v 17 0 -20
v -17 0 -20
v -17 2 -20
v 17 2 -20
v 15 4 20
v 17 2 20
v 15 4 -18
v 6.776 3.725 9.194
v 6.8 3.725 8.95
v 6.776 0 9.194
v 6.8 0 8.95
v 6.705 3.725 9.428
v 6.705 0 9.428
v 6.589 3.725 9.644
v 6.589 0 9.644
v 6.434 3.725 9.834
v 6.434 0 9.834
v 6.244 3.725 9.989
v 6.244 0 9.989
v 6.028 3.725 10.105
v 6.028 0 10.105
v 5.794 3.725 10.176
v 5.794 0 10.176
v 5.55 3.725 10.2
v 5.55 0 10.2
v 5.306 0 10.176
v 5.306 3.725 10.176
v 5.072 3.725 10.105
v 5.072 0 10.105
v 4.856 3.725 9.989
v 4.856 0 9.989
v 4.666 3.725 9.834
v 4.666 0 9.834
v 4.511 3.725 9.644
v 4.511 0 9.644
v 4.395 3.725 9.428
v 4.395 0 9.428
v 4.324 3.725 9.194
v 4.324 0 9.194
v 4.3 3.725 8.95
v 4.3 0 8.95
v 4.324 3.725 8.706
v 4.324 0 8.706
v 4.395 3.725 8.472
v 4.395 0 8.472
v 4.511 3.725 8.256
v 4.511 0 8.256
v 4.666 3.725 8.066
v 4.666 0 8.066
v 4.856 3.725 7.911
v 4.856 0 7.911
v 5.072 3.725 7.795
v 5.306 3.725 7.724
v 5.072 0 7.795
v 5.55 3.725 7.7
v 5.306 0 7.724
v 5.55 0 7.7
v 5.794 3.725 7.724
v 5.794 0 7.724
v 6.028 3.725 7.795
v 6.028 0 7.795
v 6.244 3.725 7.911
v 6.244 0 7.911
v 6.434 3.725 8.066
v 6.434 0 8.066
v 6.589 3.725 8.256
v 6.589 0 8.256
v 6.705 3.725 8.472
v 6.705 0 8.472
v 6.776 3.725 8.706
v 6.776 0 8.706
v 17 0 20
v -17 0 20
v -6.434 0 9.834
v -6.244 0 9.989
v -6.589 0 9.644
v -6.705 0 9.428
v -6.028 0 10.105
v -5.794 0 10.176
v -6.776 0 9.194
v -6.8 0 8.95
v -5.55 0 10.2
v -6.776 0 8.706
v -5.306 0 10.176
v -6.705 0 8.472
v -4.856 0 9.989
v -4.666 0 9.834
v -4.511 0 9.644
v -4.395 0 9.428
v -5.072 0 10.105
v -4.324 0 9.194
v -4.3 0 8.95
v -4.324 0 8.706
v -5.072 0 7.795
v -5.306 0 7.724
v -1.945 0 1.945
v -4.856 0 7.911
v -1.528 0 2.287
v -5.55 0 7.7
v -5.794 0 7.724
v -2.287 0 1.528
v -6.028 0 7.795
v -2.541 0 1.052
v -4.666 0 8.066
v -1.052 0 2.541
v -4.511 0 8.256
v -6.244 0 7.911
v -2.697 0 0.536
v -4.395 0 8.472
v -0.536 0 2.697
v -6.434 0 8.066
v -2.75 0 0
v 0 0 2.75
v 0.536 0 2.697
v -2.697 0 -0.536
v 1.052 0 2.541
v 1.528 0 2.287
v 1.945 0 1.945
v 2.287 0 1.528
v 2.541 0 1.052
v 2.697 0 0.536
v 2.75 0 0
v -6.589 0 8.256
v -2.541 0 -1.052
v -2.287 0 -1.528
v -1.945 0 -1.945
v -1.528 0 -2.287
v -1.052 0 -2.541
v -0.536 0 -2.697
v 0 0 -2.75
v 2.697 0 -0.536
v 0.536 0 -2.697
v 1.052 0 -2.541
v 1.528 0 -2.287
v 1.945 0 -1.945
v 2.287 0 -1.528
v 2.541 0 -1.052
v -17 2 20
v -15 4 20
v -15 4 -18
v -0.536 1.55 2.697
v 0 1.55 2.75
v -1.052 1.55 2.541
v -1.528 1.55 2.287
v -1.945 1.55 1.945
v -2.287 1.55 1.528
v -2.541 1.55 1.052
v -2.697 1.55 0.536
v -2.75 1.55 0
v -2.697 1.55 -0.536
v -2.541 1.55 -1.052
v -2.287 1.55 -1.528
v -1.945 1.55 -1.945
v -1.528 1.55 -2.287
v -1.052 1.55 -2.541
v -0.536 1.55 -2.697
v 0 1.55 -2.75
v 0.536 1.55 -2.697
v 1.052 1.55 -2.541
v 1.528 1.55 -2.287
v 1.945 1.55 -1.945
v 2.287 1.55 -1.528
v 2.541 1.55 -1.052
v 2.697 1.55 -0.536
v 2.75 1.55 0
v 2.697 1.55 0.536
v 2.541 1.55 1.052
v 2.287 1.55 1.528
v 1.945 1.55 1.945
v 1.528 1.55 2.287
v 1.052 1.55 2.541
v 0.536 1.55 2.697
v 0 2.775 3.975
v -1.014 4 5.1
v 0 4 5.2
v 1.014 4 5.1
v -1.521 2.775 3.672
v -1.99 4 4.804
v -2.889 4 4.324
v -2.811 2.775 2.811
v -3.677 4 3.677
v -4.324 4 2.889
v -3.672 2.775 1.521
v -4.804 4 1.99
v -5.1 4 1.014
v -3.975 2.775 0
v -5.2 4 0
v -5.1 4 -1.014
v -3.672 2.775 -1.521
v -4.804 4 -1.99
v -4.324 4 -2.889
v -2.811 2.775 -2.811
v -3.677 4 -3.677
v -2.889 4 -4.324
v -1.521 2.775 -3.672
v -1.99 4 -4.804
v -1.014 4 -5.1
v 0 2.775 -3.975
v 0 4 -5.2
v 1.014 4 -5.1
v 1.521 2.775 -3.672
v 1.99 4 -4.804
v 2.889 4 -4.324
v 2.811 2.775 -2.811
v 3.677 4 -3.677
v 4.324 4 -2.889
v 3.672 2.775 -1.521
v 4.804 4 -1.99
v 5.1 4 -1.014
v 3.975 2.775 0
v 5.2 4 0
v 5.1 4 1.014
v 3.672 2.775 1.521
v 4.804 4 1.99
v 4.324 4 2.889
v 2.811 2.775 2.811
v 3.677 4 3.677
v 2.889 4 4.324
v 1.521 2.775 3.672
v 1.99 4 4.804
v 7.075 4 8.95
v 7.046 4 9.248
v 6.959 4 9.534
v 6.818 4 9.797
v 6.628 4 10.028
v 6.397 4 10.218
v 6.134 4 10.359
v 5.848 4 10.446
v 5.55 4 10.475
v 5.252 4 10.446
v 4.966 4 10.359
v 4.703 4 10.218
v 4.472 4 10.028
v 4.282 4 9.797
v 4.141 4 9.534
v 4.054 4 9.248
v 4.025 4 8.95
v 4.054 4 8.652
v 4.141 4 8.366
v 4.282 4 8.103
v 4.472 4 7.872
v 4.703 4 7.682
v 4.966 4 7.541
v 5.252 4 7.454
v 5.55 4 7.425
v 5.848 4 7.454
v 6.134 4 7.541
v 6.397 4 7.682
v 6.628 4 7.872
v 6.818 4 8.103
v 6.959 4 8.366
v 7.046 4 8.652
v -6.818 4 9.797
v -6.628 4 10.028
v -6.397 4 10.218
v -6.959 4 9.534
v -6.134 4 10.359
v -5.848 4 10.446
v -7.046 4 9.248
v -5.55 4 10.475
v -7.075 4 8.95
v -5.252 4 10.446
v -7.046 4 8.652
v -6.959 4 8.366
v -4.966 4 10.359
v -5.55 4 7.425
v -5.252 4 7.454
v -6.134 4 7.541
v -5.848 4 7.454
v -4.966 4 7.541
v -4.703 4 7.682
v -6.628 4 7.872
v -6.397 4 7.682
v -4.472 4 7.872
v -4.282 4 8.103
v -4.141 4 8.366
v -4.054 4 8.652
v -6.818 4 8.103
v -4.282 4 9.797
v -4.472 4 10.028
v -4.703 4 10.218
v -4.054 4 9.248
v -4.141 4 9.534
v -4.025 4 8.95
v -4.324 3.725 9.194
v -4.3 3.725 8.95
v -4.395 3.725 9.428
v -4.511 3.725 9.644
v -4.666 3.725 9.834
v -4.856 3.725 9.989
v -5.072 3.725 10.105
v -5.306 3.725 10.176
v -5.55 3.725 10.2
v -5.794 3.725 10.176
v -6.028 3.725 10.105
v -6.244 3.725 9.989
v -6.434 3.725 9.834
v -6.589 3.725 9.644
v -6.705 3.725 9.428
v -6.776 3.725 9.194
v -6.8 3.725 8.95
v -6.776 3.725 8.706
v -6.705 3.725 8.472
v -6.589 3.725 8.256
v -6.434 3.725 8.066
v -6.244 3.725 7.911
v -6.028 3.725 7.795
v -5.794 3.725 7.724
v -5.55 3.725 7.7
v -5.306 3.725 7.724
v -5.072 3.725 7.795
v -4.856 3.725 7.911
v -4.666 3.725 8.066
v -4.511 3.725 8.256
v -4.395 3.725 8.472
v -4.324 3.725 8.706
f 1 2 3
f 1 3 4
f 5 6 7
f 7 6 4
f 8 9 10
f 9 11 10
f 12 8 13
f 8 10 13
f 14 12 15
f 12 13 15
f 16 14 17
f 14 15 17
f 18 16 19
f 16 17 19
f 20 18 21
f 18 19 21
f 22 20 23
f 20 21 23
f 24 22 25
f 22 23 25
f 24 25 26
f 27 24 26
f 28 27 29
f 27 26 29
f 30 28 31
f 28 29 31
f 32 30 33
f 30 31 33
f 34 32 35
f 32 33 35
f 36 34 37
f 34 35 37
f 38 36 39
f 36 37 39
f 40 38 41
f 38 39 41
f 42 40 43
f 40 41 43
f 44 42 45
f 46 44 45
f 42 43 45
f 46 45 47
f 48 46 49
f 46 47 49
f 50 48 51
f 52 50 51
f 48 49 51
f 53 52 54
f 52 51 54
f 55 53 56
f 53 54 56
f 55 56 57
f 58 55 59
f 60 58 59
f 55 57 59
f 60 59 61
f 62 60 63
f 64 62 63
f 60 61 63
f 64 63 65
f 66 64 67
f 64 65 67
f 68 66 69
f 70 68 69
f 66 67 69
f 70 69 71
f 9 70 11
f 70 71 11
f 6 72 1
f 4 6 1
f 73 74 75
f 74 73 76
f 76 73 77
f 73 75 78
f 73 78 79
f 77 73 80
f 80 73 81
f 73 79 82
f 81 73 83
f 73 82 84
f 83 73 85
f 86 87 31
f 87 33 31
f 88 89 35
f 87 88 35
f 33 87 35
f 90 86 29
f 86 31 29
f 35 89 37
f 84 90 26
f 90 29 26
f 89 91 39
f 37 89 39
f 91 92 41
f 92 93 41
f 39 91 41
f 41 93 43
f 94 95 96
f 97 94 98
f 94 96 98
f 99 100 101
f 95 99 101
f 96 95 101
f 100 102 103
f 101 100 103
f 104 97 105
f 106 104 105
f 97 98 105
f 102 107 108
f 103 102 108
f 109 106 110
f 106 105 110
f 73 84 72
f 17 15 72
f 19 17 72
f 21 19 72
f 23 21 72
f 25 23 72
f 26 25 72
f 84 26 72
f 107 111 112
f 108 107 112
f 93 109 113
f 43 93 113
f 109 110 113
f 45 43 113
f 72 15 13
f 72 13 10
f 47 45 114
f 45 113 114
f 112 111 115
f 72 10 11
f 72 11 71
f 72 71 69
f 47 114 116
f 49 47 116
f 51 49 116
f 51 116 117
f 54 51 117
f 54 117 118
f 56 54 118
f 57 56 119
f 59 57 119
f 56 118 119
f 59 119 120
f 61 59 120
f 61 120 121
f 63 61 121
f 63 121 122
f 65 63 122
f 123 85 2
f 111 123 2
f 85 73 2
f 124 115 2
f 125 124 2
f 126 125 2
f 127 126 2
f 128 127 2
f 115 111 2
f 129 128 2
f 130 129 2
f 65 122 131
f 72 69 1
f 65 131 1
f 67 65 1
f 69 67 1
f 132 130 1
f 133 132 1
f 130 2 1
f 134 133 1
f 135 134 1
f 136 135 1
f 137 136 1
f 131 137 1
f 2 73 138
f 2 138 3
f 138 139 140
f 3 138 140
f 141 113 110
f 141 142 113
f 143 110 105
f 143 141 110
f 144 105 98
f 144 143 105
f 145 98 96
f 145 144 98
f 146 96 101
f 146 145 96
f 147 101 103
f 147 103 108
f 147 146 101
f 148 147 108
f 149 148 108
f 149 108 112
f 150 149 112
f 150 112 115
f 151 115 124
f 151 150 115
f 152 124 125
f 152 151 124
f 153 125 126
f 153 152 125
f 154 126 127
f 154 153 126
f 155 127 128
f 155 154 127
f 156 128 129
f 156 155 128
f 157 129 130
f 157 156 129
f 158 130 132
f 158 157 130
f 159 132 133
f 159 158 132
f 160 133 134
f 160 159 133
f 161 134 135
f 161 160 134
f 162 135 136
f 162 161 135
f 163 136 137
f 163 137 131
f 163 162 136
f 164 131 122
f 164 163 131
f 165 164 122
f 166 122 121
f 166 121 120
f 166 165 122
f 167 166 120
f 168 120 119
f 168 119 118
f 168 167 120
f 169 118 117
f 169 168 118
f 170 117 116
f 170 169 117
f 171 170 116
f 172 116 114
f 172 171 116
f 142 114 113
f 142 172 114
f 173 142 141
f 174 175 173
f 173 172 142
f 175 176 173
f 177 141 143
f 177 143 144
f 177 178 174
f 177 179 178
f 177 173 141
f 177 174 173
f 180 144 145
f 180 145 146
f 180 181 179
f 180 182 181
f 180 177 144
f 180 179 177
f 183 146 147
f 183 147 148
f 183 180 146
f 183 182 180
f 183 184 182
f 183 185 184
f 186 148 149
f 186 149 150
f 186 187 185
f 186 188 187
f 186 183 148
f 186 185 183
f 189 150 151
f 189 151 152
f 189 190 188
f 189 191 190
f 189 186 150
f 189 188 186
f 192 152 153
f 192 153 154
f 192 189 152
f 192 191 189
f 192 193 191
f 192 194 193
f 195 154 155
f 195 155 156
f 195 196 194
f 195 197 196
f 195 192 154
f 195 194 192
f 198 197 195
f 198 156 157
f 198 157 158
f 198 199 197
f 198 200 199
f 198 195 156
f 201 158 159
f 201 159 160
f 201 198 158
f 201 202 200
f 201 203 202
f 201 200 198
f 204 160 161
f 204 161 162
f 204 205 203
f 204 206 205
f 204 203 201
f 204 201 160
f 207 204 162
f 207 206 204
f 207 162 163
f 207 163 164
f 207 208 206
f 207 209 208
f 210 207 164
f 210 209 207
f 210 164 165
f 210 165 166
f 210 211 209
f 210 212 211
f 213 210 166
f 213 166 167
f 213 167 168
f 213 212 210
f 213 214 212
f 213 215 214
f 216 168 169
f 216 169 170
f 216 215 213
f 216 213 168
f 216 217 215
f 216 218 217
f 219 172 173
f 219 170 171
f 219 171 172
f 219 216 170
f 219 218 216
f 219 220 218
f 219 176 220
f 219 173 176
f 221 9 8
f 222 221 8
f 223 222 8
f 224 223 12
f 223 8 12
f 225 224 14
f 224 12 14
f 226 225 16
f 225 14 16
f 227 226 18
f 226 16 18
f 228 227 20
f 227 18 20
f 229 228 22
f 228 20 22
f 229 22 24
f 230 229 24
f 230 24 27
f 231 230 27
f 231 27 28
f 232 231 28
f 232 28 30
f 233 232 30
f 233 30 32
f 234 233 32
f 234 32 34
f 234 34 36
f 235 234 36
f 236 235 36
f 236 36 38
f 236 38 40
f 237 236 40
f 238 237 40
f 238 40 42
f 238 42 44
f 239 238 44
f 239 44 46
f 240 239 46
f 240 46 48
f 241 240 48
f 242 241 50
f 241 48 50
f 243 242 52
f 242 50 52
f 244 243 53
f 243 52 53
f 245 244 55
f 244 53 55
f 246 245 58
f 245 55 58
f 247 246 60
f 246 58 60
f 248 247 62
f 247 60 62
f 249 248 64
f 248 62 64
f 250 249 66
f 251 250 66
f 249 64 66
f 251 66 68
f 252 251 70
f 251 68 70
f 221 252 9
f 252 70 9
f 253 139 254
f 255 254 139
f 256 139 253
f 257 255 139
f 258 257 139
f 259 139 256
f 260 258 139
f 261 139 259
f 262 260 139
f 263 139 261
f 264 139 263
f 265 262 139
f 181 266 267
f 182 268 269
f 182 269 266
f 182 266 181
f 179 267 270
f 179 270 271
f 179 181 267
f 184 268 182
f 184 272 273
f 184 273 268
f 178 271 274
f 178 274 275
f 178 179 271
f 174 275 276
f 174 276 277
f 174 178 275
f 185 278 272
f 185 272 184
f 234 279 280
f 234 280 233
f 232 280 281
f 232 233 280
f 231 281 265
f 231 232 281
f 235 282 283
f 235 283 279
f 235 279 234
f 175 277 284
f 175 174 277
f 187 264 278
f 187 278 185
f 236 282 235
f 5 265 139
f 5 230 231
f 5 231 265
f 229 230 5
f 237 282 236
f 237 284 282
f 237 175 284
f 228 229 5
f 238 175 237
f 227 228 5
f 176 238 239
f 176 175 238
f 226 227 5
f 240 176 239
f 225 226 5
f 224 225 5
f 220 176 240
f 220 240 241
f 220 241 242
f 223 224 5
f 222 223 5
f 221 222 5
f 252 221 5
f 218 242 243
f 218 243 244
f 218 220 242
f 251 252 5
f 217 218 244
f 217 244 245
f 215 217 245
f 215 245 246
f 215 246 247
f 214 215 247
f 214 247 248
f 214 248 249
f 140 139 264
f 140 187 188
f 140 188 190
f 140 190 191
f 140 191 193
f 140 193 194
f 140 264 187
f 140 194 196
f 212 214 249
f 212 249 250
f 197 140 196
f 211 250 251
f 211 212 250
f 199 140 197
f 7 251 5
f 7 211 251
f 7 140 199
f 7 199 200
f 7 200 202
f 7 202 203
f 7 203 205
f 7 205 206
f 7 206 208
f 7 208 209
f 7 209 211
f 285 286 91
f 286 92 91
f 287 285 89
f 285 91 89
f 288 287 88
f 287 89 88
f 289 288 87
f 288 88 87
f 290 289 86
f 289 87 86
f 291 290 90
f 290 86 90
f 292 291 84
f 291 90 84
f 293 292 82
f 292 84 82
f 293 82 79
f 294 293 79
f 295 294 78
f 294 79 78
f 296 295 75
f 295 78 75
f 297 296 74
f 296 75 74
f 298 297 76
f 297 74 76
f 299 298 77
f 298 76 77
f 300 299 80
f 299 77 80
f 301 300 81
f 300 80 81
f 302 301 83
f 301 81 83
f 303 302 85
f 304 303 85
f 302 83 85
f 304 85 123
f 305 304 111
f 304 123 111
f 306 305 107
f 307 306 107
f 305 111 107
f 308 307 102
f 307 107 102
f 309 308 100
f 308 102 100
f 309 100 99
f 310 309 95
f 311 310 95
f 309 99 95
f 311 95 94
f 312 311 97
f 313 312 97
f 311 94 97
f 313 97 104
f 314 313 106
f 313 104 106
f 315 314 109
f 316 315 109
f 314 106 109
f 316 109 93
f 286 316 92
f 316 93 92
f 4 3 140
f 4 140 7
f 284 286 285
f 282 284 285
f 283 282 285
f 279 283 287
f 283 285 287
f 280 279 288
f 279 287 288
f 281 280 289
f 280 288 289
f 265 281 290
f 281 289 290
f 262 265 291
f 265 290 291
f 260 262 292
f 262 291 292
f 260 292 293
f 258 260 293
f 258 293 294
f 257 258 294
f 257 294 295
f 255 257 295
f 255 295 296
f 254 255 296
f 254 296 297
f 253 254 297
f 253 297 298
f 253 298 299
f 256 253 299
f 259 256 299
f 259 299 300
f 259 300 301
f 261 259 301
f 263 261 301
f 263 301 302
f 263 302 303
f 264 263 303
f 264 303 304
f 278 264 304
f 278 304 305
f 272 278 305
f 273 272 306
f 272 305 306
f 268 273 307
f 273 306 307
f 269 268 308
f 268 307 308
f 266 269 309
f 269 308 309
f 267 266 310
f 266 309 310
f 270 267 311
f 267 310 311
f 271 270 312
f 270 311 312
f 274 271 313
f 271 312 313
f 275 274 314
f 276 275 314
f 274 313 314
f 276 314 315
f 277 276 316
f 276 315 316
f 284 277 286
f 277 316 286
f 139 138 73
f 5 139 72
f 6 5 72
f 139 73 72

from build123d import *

# Parameters (mm, degrees)
SKETCH_1_W                   = 34
SKETCH_1_H                   = 40
EXTRUDE_293_DEPTH            = 4
HOLE_WIZARD_1122_D           = 2.5
HOLE_WIZARD_1122_CSINK_D     = 3.05
HOLE_WIZARD_1122_CSINK_ANGLE = 90
CHAMFER_1_SIZE               = 2


with BuildPart() as part:
    # Эскиз1 → Extrude 293 (new body)
    with BuildSketch(Plane(origin=(0, 0, 0), x_dir=(1, 0, 0), z_dir=(0, 1, 0))):
        Rectangle(SKETCH_1_W, SKETCH_1_H)
    extrude(amount=EXTRUDE_293_DEPTH)

    # Эскиз3 → Крепление к профилю 40 - M5 (revolve, cut)
    with BuildSketch(Plane(origin=(0, 4, 0), x_dir=(0, 0, 1), z_dir=(1, 0, 0))):
        Polygon((0, 0), (0, 4), (2.75, 4), (2.75, 2.45), (5.2, 0), align=None)
    revolve(axis=Axis((0, 10.35, 0), (0, -1, 0)), mode=Mode.SUBTRACT)

    # Hole Wizard 1122 (through all)
    with Locations(Plane(origin=(0, 4, 0), x_dir=(-1, 0, 0), z_dir=(0, 1, 0))):
        with Locations((5.55, 8.95), (-5.55, 8.95)):
            CounterSinkHole(HOLE_WIZARD_1122_D / 2, HOLE_WIZARD_1122_CSINK_D / 2, counter_sink_angle=HOLE_WIZARD_1122_CSINK_ANGLE)

    # Фаска1
    chamfer_1_edges = [part.edges().sort_by_distance(p)[0] for p in [
        (-17, 4, 0),
        (17, 4, 0),
        (0, 4, -20),
    ]]
    chamfer(chamfer_1_edges, length=CHAMFER_1_SIZE)


solid = part.part
